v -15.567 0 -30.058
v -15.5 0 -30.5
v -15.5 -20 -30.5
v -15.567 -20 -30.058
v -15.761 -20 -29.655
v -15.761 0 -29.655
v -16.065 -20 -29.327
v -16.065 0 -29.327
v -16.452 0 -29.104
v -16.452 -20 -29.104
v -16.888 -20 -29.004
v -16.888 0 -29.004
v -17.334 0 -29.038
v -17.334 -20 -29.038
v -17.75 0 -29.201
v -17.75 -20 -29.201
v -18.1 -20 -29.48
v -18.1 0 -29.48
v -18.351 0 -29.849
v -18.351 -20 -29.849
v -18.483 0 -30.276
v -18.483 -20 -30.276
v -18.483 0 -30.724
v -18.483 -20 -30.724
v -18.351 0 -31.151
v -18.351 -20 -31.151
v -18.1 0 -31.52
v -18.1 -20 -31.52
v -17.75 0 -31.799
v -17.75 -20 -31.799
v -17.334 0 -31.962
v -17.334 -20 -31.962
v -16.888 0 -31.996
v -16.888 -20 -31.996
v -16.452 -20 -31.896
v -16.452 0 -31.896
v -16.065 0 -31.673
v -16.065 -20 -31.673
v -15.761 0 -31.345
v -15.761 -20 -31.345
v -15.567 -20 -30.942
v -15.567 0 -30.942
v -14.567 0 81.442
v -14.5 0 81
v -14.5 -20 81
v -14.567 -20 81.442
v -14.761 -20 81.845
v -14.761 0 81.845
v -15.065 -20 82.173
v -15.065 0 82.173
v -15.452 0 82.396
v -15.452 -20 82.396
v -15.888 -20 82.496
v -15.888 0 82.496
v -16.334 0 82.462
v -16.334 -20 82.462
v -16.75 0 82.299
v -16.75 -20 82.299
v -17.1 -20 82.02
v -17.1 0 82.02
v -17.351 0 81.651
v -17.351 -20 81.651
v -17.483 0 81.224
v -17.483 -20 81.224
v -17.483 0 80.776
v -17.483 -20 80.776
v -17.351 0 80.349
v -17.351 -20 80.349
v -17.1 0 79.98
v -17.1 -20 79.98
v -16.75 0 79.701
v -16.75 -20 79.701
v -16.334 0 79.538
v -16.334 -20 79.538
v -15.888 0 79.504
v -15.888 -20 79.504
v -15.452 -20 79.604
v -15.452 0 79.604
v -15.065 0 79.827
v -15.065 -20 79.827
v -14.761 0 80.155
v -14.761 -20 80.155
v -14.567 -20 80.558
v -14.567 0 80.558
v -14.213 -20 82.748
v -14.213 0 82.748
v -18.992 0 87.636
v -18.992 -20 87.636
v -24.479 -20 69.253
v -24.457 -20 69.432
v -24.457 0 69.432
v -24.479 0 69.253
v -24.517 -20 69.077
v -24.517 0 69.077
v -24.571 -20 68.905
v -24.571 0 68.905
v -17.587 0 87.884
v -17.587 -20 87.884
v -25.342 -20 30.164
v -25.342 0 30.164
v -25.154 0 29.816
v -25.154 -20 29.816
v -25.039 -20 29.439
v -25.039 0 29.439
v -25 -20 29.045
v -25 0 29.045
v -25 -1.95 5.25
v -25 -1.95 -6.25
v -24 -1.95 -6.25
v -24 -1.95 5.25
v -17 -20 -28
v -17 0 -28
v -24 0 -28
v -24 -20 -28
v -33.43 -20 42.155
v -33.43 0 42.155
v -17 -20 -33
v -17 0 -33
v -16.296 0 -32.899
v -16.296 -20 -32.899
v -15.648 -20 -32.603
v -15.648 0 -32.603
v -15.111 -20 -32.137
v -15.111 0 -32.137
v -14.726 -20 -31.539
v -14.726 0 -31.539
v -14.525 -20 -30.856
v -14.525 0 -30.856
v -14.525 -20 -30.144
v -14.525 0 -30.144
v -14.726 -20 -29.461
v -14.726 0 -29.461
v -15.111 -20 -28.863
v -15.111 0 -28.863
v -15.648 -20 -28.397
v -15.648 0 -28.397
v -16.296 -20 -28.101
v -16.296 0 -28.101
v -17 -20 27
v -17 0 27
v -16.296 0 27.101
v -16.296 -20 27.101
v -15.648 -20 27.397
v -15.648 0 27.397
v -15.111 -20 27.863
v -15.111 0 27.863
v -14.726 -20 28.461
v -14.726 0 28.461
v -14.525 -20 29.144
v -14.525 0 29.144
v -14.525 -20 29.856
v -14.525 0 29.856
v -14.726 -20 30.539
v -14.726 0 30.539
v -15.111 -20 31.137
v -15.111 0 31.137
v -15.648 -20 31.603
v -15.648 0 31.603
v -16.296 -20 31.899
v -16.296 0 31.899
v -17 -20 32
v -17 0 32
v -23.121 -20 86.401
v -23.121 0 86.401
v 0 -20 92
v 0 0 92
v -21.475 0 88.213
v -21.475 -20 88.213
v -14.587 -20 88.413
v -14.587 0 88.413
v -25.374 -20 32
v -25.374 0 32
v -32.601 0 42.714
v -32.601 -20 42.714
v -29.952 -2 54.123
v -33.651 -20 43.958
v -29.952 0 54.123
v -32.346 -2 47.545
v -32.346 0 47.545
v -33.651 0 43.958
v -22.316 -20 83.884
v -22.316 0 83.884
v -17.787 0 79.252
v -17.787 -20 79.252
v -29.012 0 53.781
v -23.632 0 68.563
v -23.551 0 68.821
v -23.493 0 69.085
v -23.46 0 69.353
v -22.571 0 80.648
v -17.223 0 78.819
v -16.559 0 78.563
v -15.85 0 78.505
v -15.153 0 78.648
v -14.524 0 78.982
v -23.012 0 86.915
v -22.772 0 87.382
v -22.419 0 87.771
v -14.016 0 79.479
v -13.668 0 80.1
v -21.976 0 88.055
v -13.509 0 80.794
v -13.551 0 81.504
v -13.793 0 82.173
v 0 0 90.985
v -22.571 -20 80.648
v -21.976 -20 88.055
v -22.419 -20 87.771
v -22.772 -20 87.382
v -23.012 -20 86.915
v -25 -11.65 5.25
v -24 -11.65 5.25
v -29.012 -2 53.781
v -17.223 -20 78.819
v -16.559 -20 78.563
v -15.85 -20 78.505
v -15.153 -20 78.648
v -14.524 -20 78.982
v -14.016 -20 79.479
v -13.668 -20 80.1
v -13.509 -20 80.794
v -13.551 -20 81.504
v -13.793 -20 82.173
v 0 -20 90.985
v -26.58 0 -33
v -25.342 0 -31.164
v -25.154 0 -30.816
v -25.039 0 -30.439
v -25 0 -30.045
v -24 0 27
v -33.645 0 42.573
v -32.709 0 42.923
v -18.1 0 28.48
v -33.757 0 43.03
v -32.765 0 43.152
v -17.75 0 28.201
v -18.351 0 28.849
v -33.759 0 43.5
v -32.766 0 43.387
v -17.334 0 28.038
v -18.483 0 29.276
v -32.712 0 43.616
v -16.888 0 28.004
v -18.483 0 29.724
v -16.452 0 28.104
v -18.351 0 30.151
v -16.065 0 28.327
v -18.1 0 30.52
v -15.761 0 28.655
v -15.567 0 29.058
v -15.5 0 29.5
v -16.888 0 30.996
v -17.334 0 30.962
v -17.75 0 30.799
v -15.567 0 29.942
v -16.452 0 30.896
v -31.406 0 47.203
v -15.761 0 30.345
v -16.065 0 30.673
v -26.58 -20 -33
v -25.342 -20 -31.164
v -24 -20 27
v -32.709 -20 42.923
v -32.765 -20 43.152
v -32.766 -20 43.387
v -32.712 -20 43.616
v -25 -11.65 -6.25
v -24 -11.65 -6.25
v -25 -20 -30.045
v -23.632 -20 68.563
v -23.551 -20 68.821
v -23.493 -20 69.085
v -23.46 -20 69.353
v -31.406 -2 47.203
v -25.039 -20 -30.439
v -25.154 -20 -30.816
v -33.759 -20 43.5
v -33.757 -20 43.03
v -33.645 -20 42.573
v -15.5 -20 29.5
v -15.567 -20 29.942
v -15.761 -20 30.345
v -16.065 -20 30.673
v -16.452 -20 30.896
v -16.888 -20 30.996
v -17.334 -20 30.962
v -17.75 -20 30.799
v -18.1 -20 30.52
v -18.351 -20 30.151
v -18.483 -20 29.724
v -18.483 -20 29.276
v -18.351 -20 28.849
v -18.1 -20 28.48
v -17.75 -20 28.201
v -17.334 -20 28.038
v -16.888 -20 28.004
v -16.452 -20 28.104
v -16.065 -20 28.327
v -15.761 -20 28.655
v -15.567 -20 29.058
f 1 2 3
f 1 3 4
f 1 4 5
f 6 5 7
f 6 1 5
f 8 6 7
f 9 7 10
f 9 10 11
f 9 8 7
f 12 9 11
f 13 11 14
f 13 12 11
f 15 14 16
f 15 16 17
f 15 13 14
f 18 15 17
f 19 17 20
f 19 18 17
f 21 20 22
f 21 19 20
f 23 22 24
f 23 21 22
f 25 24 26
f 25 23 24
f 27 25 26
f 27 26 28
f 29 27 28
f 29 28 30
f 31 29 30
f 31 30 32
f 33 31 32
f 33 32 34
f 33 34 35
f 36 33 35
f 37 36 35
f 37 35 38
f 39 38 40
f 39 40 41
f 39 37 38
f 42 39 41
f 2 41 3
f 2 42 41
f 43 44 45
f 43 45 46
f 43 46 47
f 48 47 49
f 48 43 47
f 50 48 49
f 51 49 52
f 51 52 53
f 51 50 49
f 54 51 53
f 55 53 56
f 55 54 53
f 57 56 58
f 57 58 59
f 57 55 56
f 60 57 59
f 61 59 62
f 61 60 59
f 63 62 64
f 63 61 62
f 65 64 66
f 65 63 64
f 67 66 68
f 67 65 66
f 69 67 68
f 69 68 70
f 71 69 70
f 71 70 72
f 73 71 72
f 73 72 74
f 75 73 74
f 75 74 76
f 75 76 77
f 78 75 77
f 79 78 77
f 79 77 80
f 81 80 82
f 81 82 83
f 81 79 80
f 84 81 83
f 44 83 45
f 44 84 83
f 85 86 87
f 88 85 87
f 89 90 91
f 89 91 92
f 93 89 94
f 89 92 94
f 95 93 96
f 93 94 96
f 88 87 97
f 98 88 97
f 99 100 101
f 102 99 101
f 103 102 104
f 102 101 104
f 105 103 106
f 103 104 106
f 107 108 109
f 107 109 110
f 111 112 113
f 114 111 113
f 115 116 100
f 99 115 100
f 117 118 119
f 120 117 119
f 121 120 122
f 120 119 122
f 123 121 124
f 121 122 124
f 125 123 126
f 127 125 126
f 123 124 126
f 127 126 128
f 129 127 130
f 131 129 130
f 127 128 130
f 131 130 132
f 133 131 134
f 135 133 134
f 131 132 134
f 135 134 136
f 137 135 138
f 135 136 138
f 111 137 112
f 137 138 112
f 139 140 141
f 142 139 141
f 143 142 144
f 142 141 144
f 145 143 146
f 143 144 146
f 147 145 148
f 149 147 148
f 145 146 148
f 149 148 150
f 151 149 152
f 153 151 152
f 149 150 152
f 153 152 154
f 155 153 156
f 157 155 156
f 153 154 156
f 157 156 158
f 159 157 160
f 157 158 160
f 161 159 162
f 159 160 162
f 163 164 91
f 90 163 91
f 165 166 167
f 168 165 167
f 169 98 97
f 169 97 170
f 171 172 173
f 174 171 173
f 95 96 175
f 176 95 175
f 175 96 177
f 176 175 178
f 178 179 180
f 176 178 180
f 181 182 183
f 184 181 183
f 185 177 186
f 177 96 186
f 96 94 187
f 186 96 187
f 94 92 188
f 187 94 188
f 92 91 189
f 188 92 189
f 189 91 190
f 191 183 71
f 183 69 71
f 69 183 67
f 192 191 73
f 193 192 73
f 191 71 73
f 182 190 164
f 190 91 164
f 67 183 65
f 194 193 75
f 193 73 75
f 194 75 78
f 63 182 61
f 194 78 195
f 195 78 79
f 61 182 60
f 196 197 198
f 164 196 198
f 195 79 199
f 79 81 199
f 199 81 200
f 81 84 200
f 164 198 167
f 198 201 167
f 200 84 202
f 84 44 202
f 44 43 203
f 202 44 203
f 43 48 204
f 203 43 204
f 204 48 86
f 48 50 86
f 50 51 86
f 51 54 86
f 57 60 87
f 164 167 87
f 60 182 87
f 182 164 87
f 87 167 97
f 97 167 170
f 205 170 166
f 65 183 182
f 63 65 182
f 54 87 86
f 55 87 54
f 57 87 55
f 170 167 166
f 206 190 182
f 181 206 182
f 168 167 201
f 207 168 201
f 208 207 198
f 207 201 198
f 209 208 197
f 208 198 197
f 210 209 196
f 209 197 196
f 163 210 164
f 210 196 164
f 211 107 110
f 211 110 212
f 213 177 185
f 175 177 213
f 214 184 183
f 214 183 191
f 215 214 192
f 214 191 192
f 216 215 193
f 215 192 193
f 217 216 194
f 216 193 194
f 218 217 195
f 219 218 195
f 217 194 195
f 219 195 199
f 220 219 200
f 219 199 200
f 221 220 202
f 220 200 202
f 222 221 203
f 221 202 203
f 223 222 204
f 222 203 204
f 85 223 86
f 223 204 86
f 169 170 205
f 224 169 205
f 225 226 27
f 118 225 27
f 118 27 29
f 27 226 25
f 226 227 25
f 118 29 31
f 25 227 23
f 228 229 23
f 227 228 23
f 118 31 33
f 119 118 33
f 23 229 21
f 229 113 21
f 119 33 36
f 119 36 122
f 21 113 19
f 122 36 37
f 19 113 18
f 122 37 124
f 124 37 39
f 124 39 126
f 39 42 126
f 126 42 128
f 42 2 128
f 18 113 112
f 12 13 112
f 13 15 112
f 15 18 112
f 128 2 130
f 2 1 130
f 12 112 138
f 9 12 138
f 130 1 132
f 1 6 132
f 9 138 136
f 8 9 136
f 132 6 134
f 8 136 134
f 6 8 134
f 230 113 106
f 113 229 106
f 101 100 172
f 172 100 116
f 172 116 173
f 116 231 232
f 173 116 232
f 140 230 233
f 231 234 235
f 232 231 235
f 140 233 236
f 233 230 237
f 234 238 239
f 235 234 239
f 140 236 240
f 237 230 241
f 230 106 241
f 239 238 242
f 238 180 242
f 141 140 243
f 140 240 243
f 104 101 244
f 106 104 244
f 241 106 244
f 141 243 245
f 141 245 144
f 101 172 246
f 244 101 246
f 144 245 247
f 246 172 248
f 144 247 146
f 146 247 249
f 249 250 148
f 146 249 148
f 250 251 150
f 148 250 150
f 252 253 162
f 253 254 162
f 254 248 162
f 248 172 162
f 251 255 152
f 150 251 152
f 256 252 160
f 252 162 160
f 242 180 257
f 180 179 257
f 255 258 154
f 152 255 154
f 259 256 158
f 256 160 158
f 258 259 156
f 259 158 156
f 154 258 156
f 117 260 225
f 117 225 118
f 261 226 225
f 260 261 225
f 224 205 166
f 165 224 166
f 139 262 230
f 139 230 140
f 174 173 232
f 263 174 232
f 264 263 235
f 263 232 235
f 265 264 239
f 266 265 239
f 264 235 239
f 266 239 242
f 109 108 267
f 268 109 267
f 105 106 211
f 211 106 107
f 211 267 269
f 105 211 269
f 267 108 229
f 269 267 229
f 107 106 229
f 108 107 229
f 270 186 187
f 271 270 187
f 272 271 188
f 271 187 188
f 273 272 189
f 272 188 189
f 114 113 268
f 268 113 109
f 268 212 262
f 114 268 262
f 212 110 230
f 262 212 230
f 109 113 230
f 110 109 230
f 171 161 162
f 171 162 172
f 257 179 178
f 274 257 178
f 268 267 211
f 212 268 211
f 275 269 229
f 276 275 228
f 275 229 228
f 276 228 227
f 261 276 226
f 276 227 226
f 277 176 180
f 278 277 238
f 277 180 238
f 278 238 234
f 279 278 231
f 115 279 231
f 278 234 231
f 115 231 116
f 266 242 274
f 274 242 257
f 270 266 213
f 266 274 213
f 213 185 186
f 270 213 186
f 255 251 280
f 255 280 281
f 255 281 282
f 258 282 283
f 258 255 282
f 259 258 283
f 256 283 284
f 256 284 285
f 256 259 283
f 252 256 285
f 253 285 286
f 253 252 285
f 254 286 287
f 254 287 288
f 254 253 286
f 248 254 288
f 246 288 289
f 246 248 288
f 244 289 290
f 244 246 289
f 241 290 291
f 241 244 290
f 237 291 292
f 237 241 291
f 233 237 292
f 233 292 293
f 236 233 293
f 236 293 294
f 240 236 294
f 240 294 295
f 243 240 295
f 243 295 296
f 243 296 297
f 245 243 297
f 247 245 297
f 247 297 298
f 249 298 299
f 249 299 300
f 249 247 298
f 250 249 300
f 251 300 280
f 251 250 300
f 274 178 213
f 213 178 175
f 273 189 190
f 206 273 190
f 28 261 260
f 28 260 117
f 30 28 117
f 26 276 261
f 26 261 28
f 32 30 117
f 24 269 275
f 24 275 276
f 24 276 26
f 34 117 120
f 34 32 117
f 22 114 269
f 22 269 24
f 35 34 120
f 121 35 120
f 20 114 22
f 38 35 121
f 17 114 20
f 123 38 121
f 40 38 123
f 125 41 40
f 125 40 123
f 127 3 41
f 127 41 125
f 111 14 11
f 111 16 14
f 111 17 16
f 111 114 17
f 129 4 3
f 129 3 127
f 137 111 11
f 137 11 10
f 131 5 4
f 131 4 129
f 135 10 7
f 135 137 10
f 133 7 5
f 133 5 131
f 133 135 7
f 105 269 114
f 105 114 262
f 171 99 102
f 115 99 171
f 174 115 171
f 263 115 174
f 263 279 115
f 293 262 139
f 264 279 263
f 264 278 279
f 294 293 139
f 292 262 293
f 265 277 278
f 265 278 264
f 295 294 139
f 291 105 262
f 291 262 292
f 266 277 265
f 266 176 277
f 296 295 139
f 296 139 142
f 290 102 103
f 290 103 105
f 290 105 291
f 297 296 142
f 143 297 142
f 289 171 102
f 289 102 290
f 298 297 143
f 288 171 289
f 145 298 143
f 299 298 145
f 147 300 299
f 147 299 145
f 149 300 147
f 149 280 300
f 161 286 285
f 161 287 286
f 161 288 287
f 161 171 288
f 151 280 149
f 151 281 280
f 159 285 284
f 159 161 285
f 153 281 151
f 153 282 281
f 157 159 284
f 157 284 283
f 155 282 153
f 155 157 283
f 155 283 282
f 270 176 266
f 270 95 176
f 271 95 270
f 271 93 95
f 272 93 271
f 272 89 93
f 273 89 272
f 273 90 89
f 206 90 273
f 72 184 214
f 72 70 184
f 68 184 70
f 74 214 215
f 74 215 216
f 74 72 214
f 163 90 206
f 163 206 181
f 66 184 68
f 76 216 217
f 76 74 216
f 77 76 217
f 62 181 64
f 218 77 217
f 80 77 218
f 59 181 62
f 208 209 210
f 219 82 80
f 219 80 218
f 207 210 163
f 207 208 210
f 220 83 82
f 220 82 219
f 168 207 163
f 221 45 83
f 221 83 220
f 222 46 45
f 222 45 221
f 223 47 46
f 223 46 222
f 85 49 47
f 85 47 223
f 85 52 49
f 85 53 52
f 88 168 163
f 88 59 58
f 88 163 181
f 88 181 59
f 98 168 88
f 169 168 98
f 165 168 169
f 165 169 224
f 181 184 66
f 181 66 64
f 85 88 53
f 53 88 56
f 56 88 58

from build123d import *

# Parameters (mm, degrees)
F1_R     = 1.5
F2_DEPTH = 20
F3_W     = 2
F3_H     = 7
F4_DEPTH = 25
F5_W     = 9.7
F5_H     = 11.5
F6_DEPTH = 25


# Not quite as in the source:
# - ends of sketch curves that miss each other by under 0.0002 mm in the source are joined


with BuildPart() as f2:
    # F1 (on Front) → F2 (new body)
    with BuildSketch(Plane.XZ):
        with BuildLine():
            Line((-22.3164947392, 83.8837339027), (-17.7874447277, 79.2521323433))
            ThreePointArc((-17.7874447277, 79.2521323433), (-14.2521323433, 79.2125552723), (-14.2125552723, 82.7478676567))
            Line((-14.2125552723, 82.7478676567), (-18.9921983086, 87.6357364337))
            Line((-18.9921983086, 87.6357364337), (-17.5868240881, 87.8835418245))
            Line((-17.5868240881, 87.8835418245), (-14.5868240881, 88.4125227619))
            Line((-14.5868240881, 88.4125227619), (0, 90.9845733884))
            Line((0, 90.9845733884), (0, 92))
            Line((0, 92), (-21.474961, 88.213385))
            ThreePointArc((-21.474961, 88.213385), (-22.6081005709, 87.5885032671), (-23.1214986845, 86.4006879752))
            Line((-23.1214986845, 86.4006879752), (-24.456969, 69.431938))
            ThreePointArc((-24.456969, 69.431938), (-24.4963407526, 69.1645008146), (-24.5714176946, 68.9048158888))
            Line((-24.5714176946, 68.9048158888), (-33.651464, 43.957595))
            ThreePointArc((-33.651464, 43.957595), (-33.757171385, 43.0298159786), (-33.4301544738, 42.1551686804))
            Line((-33.4301544738, 42.1551686804), (-25.341925, 30.163876))
            ThreePointArc((-25.341925, 30.163876), (-25.0873905233, 29.6302335248), (-25, 29.04549))
            Line((-25, 29.04549), (-25, 27))
            Line((-25, 27), (-25, -0.5))
            Line((-25, -0.5), (-24.0000002534, -0.5))
            Line((-24.0000002534, -0.5), (-24.0000002534, 27))
            Line((-24.0000002534, 27), (-17, 27))
            ThreePointArc((-17, 27), (-14.5, 29.5), (-17, 32))
            Line((-17, 32), (-25, 32))
            Line((-25, 32), (-25.3741885909, 32))
            Line((-25.3741885909, 32), (-32.6011163068, 42.7143612935))
            ThreePointArc((-32.6011163068, 42.7143612935), (-32.7646248248, 43.1516847064), (-32.7117713086, 43.6155740346))
            Line((-32.7117713086, 43.6155740346), (-23.6317251212, 68.5627955495))
            ThreePointArc((-23.6317251212, 68.5627955495), (-23.5191096678, 68.9523229367), (-23.4600509821, 69.3534786388))
            Line((-23.4600509821, 69.3534786388), (-22.5711850089, 80.6475881907))
            Line((-22.5711850089, 80.6475881907), (-22.3164947392, 83.8837339027))
        make_face()
        with Locations((-17, 29.5)):
            Circle(F1_R, mode=Mode.SUBTRACT)
        with Locations((-16, 81)):
            Circle(F1_R, mode=Mode.SUBTRACT)
        with BuildLine():
            Line((-24.0000002534, -28), (-24.0000002534, -0.5))
            Line((-24.0000002534, -0.5), (-25, -0.5))
            Line((-25, -0.5), (-25, -30.04549))
            ThreePointArc((-25, -30.04549), (-25.0873905233, -30.6302335248), (-25.3419249898, -31.1638760069))
            Line((-25.341925, -31.163876), (-26.5804062367, -33))
            Line((-26.5804062367, -33), (-25, -33))
            Line((-25, -33), (-17, -33))
            ThreePointArc((-17, -33), (-14.5, -30.5), (-17, -28))
            Line((-17, -28), (-24.0000002534, -28))
        make_face()
        with Locations((-17, -30.5)):
            Circle(F1_R, mode=Mode.SUBTRACT)
    extrude(amount=F2_DEPTH)

    # F3 (on face) → F4 (cut)
    with BuildSketch(Plane(origin=(-43.8426892635, 0, 15.9574341077), x_dir=(0, -1, 0), z_dir=(-0.9396926192, 0, 0.3420201476))):
        with Locations((1, 37.1150750518)):
            Rectangle(F3_W, F3_H)
    extrude(amount=-F4_DEPTH, mode=Mode.SUBTRACT)

    # F5 (on face) → F6 (cut)
    with BuildSketch(Plane(origin=(-25, 0, 0), x_dir=(0, -1, 0), z_dir=(-1, 0, 0))):
        with Locations((6.8, -0.5)):
            Rectangle(F5_W, F5_H)
    extrude(amount=-F6_DEPTH, mode=Mode.SUBTRACT)


solid = f2.part
